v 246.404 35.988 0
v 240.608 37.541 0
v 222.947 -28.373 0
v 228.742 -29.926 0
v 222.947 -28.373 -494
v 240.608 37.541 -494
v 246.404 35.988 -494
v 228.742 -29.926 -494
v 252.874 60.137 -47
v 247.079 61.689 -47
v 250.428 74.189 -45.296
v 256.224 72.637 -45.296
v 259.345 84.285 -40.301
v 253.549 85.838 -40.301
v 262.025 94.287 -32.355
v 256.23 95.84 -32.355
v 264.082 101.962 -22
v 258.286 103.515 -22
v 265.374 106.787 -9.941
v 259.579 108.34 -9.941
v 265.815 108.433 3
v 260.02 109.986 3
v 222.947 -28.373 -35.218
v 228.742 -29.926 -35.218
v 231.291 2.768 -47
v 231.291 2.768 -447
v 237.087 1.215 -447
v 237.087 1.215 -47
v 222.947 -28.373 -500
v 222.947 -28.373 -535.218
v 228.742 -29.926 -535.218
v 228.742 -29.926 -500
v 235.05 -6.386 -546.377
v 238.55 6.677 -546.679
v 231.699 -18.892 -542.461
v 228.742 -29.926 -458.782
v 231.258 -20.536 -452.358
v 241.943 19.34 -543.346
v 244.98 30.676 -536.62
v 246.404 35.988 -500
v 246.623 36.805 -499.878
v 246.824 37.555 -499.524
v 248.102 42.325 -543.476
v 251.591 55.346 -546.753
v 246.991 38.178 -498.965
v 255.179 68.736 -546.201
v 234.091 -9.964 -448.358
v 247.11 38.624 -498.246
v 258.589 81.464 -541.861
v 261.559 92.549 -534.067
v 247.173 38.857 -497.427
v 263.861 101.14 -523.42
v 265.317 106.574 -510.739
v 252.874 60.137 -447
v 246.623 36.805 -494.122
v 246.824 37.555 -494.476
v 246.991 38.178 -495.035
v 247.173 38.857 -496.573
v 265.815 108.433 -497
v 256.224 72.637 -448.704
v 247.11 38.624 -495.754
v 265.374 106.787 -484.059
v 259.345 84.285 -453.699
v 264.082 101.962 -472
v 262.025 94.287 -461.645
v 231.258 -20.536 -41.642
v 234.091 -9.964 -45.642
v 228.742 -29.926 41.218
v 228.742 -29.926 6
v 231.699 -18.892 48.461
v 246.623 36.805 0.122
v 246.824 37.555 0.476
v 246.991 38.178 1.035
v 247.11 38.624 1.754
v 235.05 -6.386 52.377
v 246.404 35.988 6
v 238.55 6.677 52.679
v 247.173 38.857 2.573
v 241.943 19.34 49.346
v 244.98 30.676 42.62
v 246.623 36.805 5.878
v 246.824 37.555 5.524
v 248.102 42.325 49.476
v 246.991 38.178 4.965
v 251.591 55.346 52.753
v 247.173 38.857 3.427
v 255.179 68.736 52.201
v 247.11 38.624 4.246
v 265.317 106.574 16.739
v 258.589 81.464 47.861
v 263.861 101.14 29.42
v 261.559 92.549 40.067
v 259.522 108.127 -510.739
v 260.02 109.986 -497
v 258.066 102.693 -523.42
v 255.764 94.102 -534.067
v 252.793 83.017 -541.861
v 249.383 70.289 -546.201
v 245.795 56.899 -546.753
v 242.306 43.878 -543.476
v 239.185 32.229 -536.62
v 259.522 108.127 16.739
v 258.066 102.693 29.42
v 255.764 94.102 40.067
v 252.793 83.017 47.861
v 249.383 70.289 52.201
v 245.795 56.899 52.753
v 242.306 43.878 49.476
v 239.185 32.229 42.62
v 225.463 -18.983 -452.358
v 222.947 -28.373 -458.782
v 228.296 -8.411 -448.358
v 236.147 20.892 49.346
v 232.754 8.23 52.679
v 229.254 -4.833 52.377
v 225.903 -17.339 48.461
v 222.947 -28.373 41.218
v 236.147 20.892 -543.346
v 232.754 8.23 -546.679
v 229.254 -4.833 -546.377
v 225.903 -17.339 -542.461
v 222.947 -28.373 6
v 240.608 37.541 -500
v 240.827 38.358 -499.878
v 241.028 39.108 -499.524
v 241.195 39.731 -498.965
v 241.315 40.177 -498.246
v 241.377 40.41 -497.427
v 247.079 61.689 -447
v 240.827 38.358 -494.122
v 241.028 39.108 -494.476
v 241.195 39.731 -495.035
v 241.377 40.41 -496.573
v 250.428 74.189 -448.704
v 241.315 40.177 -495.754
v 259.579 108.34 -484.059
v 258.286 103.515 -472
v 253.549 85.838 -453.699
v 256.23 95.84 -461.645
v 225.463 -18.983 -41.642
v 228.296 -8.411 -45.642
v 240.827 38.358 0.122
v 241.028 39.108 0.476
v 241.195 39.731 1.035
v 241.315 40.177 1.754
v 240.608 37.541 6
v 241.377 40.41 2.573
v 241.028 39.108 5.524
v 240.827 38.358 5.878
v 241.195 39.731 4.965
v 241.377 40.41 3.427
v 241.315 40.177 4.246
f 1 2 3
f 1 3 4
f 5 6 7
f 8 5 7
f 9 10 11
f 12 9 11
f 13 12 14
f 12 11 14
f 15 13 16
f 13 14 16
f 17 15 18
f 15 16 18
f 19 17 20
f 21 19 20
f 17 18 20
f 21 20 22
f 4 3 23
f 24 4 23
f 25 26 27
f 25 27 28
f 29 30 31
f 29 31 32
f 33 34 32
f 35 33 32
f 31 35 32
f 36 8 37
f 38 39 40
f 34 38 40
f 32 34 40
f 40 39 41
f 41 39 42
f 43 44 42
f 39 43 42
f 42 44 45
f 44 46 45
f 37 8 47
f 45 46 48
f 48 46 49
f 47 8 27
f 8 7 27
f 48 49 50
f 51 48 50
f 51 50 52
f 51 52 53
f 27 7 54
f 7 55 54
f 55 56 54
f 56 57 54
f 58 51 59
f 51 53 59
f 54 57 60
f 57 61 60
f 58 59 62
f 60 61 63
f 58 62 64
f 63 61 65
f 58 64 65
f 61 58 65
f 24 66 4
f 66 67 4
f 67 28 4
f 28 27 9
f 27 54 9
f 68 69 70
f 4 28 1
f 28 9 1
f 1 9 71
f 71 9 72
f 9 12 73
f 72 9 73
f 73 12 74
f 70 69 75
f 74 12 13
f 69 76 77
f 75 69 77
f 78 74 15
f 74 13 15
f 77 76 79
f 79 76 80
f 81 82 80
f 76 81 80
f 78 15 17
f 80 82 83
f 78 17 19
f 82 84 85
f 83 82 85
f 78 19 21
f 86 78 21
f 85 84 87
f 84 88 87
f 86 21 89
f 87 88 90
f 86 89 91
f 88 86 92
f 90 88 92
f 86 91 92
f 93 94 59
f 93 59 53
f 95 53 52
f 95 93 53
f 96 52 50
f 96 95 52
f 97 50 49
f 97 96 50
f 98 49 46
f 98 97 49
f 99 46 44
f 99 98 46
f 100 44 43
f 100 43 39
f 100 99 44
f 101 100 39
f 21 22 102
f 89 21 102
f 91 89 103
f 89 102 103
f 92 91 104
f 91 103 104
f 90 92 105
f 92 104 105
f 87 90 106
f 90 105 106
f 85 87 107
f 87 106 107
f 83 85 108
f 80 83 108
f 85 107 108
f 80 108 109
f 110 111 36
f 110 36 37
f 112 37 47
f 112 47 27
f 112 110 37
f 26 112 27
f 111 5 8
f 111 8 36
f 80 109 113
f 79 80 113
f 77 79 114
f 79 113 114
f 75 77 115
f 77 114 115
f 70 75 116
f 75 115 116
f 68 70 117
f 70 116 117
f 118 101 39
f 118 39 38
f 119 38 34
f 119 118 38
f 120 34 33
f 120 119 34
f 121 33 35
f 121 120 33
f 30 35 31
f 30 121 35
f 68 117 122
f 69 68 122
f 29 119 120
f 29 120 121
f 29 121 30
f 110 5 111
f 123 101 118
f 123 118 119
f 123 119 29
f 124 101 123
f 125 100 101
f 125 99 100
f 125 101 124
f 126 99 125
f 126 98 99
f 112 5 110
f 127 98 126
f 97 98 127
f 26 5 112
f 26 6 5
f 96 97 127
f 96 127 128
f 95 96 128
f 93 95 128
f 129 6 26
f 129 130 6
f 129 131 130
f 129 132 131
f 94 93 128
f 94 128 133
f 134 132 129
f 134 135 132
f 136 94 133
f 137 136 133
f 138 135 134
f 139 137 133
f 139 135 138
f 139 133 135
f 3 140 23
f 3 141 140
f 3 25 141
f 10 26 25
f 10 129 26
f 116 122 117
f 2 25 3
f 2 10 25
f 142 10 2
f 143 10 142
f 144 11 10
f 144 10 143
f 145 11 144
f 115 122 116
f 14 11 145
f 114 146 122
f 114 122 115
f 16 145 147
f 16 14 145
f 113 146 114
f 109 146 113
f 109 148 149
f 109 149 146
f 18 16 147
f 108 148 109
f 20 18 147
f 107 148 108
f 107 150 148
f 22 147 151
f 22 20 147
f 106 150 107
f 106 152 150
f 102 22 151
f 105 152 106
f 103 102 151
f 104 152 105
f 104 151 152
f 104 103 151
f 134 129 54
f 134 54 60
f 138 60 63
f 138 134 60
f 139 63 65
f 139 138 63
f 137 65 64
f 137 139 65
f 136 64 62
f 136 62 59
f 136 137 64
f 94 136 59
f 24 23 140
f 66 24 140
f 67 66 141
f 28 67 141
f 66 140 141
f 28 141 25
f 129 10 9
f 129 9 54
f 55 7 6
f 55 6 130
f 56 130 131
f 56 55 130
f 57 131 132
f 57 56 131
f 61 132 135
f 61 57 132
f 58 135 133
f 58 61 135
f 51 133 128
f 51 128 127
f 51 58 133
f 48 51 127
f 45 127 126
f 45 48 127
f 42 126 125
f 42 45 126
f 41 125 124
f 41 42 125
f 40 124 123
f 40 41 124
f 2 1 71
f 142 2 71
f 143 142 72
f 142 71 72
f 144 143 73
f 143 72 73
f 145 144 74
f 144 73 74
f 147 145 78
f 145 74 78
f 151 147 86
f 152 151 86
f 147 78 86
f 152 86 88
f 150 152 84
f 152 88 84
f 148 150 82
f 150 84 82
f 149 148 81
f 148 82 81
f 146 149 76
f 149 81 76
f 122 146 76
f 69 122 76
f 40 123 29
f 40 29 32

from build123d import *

# Parameters (mm, degrees)
RESSALTO_EXTRUS_O2_DEPTH = 6
RESSALTO_EXTRUS_O3_DEPTH = 6
CORTE_EXTRUS_O1_DEPTH    = 303.732253462


with BuildPart() as part:
    # Esboço1 → Ressalto-extrusão2 (new body)
    with BuildSketch(Plane.XY):
        with BuildLine():
            Line((-199.999999999, 0), (199.999999999, 0))
            ThreePointArc((199.999999999, 0), (202.565835097, -15.811388301), (209.999999999, -30))
            Line((209.999999999, -30), (289.999999999, -30))
            ThreePointArc((289.999999999, -30), (299.999014124, 0.31398499), (289.62007067, 30.5))
            ThreePointArc((289.62007067, 30.5), (297.818976076, 75.60635228), (265.815415017, 108.432822474))
            Line((265.815415017, 108.432822474), (246.403986634, 35.988385502))
            ThreePointArc((246.403986634, 35.988385502), (242.72975202, 33.867065158), (240.608431676, 37.541299773))
            Line((240.608431676, 37.541299773), (260.019860059, 109.985736744))
            ThreePointArc((260.019860059, 109.985736744), (218.38507475, 99.736242739), (199.999999999, 61))
            Line((199.999999999, 61), (140, 61))
            Line((140, 61), (150.784643454, 58.387579086))
            Line((150.784643454, 58.387579086), (139.047219324, 52.742194858))
            Line((139.047219324, 52.742194858), (160.085396074, 40.245061921))
            Line((160.085396074, 40.245061921), (137.597498913, 43.437533109))
            Line((137.597498913, 43.437533109), (153.154101004, 34.194272541))
            Line((153.154101004, 34.194272541), (138.26257587, 30.30469508))
            Line((138.26257587, 30.30469508), (144.152507453, 26))
            Line((144.152507453, 26), (149.999999999, 26))
            ThreePointArc((149.999999999, 26), (152.999999999, 23), (149.999999999, 20))
            Line((149.999999999, 20), (-149.999999999, 20))
            ThreePointArc((-149.999999999, 20), (-152.999999999, 23), (-149.999999999, 26))
            Line((-149.999999999, 26), (-144.152507453, 26))
            Line((-144.152507453, 26), (-138.26257587, 30.30469508))
            Line((-138.26257587, 30.30469508), (-153.154101004, 34.194272541))
            Line((-153.154101004, 34.194272541), (-137.597498913, 43.437533109))
            Line((-137.597498913, 43.437533109), (-160.085396074, 40.245061921))
            Line((-160.085396074, 40.245061921), (-139.047219324, 52.742194858))
            Line((-139.047219324, 52.742194858), (-150.784643454, 58.387579086))
            Line((-150.784643454, 58.387579086), (-140, 61))
            Line((-140, 61), (-199.999999999, 61))
            ThreePointArc((-199.999999999, 61), (-218.38507475, 99.736242739), (-260.019860059, 109.985736744))
            Line((-260.019860059, 109.985736744), (-240.608431676, 37.541299773))
            ThreePointArc((-240.608431676, 37.541299773), (-242.72975202, 33.867065158), (-246.403986634, 35.988385502))
            Line((-246.403986634, 35.988385502), (-265.815415017, 108.432822474))
            ThreePointArc((-265.815415017, 108.432822474), (-297.818976076, 75.60635228), (-289.62007067, 30.5))
            ThreePointArc((-289.62007067, 30.5), (-299.999014124, 0.31398499), (-289.999999999, -30))
            Line((-289.999999999, -30), (-209.999999999, -30))
            ThreePointArc((-209.999999999, -30), (-202.565835097, -15.811388301), (-199.999999999, 0))
        make_face()
    extrude(amount=RESSALTO_EXTRUS_O2_DEPTH)


with BuildPart() as body_2:
    # Esboço4 → Ressalto-extrusão3 (new body)
    with BuildSketch(Plane(origin=(215.105397993, -57.63731768, 0), x_dir=(0, 0, -1), z_dir=(0.9659258262890679, -0.25881904510252246, 0))):
        with BuildLine():
            Line((246.999999999, 62.536155533), (246.999999999, 123.536155533))
            Line((246.999999999, 123.536155533), (47, 123.536155533))
            ThreePointArc((47, 123.536155533), (32.355339059, 158.891494592), (-3, 173.536155533))
            ThreePointArc((-3, 173.536155533), (-47.860896112, 145.615557699), (-42.620070671, 93.036155533))
            ThreePointArc((-42.620070671, 93.036155533), (-52.987511897, 61.418723482), (-41.217566642, 30.296155533))
            Line((-41.217566642, 30.296155533), (35.217566642, 30.296155533))
            ThreePointArc((35.217566642, 30.296155533), (43.96210351, 45.373380875), (47, 62.536155533))
            Line((47, 62.536155533), (246.999999999, 62.536155533))
        make_face()
    extrude(amount=RESSALTO_EXTRUS_O3_DEPTH)

    # Combinar1: cut part
    add(part.part, mode=Mode.SUBTRACT)

    # Esboço6 → Corte-extrusão1 (cut, through all)
    with BuildSketch(Plane(origin=(220.900952951, -59.190231951, 0), x_dir=(0, 0, -1), z_dir=(0.9659258262890679, -0.2588190451025225, 0))):
        with BuildLine():
            Line((-6, 98.536155533), (-6, 92.597624289))
            Line((-6, 92.597624289), (0, 92.597624289))
            Line((0, 92.597624289), (0, 98.536155533))
            ThreePointArc((0, 98.536155533), (-3, 101.536155533), (-6, 98.536155533))
        make_face()
    extrude(amount=-CORTE_EXTRUS_O1_DEPTH, mode=Mode.SUBTRACT)

    # Espelhar2: body 2 across plane


with BuildPart() as body_2_1:
    add(body_2.part)
    add(body_2.part.mirror(Plane(origin=(237.086501011, 1.215055756, -246.999999999), x_dir=(1, 0, 0), z_dir=(0, 0, 1))))


solid = body_2_1.part
